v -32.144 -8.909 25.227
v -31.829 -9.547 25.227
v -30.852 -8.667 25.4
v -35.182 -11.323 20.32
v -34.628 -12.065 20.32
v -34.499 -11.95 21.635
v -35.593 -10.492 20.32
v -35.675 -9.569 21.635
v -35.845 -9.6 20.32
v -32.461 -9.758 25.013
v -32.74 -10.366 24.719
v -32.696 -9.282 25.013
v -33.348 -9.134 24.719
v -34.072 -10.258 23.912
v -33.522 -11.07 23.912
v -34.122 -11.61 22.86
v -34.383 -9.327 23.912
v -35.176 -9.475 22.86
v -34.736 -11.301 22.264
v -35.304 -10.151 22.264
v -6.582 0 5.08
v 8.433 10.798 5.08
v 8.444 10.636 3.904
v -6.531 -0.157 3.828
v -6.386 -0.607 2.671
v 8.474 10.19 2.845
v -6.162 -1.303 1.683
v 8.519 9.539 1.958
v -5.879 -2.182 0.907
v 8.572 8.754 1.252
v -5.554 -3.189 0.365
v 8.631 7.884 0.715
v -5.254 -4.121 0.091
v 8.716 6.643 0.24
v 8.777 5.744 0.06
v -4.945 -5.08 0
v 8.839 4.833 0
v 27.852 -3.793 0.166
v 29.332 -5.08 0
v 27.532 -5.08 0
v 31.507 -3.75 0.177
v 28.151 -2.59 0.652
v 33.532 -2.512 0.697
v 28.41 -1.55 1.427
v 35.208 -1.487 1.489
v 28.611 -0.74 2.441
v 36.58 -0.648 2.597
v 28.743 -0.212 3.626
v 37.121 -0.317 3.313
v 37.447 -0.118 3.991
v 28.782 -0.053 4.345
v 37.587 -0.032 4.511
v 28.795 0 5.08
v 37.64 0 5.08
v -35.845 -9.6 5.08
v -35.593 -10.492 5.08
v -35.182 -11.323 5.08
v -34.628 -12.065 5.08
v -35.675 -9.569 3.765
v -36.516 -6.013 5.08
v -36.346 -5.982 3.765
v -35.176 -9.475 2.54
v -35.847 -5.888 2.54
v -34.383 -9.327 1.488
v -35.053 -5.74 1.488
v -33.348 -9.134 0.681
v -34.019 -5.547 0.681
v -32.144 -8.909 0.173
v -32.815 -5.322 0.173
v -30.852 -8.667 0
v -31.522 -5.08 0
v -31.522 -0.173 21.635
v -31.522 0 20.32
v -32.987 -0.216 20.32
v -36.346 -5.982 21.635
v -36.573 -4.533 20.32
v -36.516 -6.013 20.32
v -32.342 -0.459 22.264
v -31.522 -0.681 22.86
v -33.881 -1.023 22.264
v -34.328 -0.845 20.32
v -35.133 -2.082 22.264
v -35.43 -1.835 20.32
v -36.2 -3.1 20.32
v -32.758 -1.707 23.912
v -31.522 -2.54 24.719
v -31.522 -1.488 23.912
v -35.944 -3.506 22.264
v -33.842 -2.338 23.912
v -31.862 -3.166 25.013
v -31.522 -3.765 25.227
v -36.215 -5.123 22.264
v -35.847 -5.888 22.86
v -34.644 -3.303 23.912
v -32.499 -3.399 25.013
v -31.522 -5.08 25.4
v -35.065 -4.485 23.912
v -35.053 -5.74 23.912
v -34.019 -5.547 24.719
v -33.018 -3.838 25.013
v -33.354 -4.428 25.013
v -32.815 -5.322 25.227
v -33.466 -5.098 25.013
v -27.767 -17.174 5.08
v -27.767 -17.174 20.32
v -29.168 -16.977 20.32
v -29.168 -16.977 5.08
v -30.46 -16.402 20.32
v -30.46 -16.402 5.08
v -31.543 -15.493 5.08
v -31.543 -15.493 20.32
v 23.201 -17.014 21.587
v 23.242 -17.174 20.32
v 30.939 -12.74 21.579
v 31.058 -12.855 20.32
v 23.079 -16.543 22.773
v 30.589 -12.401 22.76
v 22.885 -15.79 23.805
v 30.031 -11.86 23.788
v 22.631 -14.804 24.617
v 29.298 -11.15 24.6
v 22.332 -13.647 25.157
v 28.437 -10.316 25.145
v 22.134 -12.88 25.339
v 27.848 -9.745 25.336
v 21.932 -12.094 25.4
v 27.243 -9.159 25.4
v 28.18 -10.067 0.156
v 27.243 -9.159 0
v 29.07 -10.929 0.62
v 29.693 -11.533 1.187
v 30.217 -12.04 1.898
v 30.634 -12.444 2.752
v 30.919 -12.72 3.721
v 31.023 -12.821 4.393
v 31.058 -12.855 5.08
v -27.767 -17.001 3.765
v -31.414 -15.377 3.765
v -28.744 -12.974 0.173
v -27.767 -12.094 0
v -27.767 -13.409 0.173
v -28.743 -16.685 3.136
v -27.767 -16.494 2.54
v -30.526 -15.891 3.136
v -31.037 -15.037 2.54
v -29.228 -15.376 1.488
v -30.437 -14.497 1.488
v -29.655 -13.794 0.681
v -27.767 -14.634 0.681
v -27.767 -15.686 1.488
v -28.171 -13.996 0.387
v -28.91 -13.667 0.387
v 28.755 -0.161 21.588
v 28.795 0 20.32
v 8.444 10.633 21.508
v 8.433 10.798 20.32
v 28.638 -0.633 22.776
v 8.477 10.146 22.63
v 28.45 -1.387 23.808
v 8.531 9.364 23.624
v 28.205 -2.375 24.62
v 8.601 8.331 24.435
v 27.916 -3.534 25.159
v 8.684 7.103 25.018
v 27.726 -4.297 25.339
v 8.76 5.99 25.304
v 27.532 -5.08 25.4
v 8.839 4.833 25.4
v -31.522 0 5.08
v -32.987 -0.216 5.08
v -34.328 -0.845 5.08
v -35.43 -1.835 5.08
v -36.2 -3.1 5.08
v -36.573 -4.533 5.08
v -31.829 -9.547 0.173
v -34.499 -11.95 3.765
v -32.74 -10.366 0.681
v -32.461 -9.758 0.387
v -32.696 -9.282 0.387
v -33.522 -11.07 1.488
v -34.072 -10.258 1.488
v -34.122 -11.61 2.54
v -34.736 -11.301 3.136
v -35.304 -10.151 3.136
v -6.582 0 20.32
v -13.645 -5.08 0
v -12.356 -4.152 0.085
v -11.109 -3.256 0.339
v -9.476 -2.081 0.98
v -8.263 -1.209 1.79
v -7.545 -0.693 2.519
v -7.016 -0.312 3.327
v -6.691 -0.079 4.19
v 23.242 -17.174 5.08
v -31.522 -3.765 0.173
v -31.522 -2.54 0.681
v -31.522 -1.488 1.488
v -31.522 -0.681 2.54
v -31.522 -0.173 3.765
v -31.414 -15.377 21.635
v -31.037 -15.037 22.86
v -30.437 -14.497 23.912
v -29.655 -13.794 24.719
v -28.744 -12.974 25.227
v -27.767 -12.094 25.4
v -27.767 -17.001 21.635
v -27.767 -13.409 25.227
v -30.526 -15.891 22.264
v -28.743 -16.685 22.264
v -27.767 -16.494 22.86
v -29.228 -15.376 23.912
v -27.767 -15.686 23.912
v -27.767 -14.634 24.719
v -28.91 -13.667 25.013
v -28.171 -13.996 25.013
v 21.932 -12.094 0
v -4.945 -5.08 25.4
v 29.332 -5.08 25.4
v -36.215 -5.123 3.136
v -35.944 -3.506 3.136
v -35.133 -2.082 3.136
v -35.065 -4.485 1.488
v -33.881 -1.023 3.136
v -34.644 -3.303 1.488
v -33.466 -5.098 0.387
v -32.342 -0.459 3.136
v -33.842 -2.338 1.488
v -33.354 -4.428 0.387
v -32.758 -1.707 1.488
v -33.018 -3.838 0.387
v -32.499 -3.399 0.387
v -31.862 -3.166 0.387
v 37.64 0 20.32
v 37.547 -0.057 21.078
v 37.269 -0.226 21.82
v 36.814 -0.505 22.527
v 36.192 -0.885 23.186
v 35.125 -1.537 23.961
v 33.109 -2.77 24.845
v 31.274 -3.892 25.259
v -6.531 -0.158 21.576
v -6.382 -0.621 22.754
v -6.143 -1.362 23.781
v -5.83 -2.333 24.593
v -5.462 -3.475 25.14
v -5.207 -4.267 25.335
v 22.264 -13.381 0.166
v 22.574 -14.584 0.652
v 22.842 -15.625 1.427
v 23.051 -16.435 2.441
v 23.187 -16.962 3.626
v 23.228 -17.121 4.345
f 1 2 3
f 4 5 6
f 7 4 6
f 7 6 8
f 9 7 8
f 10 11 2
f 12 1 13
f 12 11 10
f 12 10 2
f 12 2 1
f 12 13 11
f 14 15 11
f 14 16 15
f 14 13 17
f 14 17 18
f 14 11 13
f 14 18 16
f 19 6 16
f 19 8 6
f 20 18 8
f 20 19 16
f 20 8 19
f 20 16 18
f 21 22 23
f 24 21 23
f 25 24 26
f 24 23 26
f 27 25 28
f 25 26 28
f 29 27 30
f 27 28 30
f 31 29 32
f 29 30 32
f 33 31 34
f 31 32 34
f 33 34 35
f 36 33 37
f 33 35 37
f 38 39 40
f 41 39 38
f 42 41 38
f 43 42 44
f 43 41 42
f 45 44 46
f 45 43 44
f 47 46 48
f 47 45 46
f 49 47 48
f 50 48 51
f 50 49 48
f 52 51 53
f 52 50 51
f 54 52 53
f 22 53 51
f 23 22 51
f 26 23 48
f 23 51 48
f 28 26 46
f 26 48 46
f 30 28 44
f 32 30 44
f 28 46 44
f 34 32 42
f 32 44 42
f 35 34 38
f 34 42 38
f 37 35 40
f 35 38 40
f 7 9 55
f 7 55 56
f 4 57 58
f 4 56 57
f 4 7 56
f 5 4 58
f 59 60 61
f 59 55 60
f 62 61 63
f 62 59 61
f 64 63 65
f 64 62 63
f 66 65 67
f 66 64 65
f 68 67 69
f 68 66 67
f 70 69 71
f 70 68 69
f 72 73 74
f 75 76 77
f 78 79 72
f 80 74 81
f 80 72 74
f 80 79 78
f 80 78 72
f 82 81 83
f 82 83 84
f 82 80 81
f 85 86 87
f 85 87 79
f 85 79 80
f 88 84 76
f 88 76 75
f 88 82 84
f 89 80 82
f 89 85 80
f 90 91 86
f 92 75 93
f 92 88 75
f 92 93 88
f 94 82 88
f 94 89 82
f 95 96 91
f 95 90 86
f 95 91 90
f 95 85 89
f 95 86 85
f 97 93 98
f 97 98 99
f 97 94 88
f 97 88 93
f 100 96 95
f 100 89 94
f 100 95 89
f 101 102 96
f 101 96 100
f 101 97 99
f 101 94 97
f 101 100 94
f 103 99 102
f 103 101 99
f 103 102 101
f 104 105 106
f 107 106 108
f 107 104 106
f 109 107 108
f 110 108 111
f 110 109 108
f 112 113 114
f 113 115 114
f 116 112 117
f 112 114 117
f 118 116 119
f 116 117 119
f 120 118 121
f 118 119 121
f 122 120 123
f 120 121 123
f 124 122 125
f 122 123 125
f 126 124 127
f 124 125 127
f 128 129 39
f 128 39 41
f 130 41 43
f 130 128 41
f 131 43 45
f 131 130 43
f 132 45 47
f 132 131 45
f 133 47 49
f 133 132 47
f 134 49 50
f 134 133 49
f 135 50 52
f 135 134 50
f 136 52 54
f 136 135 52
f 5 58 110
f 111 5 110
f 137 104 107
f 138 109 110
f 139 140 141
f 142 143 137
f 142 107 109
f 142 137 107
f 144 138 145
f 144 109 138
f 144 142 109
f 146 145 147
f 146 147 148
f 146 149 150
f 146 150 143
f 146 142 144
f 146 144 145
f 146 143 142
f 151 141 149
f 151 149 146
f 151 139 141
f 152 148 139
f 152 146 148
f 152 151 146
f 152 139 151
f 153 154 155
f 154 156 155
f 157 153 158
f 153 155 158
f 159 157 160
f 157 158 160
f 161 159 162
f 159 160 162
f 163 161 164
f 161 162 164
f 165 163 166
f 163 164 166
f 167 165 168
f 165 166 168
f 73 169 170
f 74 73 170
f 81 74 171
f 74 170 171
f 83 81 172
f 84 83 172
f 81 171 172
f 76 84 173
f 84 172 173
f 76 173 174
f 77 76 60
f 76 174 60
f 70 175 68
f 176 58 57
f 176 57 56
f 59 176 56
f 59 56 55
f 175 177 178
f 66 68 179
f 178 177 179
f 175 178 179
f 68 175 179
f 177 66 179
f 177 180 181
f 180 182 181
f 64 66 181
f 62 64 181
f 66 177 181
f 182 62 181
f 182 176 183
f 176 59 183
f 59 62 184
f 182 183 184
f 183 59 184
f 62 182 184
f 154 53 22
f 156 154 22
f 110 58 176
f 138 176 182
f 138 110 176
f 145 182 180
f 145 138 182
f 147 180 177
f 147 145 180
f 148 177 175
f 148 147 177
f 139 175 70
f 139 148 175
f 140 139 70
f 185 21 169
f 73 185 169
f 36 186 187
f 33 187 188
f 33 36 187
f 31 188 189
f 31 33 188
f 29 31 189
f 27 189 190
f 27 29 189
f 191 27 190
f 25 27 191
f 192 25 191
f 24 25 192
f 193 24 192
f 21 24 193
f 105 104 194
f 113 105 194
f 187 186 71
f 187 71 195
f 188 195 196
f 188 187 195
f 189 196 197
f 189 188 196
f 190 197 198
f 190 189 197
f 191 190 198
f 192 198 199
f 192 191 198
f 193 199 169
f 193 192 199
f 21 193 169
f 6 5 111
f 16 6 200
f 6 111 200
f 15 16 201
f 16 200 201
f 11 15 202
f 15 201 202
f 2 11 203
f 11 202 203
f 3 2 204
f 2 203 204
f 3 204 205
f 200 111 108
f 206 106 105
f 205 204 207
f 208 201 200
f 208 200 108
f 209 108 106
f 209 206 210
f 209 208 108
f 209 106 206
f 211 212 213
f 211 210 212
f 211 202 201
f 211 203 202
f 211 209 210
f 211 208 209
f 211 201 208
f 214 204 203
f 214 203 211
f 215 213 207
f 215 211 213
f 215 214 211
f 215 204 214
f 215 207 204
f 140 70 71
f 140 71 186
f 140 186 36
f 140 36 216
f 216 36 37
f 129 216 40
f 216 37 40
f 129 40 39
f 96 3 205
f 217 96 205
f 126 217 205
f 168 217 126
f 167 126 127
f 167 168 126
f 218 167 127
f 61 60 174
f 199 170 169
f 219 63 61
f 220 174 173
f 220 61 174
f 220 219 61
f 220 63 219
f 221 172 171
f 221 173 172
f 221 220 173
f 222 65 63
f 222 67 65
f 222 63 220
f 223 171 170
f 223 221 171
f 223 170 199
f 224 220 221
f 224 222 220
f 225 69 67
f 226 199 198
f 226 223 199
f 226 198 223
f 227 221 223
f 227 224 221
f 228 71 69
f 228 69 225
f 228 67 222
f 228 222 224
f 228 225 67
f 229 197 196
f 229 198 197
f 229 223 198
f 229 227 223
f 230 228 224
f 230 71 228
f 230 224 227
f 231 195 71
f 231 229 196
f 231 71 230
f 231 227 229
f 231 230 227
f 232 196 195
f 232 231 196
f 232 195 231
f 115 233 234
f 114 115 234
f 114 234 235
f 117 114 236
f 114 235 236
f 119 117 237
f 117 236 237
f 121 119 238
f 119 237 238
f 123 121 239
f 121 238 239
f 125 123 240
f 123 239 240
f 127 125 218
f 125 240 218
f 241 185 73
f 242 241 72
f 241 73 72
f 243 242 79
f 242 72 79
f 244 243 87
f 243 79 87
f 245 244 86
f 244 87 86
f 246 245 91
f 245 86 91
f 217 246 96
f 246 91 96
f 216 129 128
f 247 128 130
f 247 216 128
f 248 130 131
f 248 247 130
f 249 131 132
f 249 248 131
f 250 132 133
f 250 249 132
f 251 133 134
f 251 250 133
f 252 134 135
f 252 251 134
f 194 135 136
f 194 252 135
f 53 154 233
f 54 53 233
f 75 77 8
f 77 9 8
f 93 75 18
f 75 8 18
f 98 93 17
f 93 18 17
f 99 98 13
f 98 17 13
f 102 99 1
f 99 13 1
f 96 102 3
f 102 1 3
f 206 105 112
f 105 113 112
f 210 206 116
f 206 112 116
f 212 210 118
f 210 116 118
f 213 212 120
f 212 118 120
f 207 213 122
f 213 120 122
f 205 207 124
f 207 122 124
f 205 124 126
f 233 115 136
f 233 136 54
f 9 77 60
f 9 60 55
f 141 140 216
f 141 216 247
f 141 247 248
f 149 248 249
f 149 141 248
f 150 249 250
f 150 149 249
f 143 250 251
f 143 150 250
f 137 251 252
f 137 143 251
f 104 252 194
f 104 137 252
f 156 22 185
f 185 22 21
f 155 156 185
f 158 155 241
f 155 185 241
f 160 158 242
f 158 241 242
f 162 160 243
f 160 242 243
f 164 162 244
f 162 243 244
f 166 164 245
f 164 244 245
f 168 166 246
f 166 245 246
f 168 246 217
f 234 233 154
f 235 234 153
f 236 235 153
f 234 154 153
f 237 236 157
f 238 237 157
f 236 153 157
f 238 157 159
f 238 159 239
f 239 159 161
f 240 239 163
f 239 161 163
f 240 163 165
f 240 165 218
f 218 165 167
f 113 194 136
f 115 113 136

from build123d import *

# Parameters (mm, degrees)
F2_DEPTH     = 25.4
F3_R         = 5.08
F4_T1_DEPTH  = 63.7089962256
F4_T3_DEPTH  = 34.3299805756
F4_T5_DEPTH  = 39.8420593032
F4_T7_DEPTH  = 15.24
F4_T12_DEPTH = 5.08
F4_T18_DEPTH = 5.08
F4_T24_DEPTH = 5.08
F4_T30_DEPTH = 5.08
F4_T36_DEPTH = 37.6403571065
F4_T41_DEPTH = 43.8944483223
F4_T46_DEPTH = 48.4484626095
F4_T51_DEPTH = 34.2442917913
F4_T57_DEPTH = 43.8944483223
F4_T61_DEPTH = 37.6403571065
F4_T68_DEPTH = 48.4484626095
F4_T72_DEPTH = 34.2442917913


# Not quite as in the source:
# - a fillet or chamfer that OpenCascade refuses, or shapes differently, is made with other operations: its cross-section is extruded or revolved along the edge and cut away or added


with BuildPart() as f2:
    # F1 (on face) → F2 (new body)
    with BuildSketch(Plane.XY):
        Polygon((8.4329312667, 10.7982652262), (-6.5817977302, 0), (-37.6396663487, 0), (-35.5828553438, -11.0039459541), (-30.0294607878, -17.1743836254), (23.241976276, -17.1743836254), (31.0578662902, -12.8550762311), (37.6396663487, 0), (28.7953745574, 0), align=None)
    extrude(amount=F2_DEPTH)

    # F3
    f3_edges = [f2.edges().sort_by_distance(p)[0] for p in [
        (-22.110732, 0, 25.4),
        (18.614153, 5.399133, 25.4),
        (33.21752, 0, 25.4),
        (34.348766, -6.427538, 25.4),
        (27.149921, -15.01473, 25.4),
        (-3.393742, -17.174384, 25.4),
        (-32.806158, -14.089165, 25.4),
        (-36.611261, -5.501973, 25.4),
        (-32.806158, -14.089165, 0),
        (-36.611261, -5.501973, 0),
        (-35.582855, -11.003946, 12.7),
        (0.925567, 5.399133, 25.4),
    ]]
    fillet(f3_edges, radius=F3_R)

    # F4: fillet of radius 5.08 on 11 edges, made by hand

    # F4_s2 → F4_t1 (cut)
    with BuildSketch(Plane.YZ.offset(-27.7670199495)):
        with BuildLine():
            ThreePointArc((-12.0943836254, 0), (-15.6864860738, 1.4878975516), (-17.1743836254, 5.08))
            Line((-17.1743836254, 5.08), (-17.1743836254, 0))
            Line((-17.1743836254, 0), (-12.0943836254, 0))
        make_face()
    extrude(amount=F4_T1_DEPTH, mode=Mode.SUBTRACT)

    # F4_s4 → F4_t3 (cut)
    with BuildSketch(Plane(origin=(-0.5817443509, -0.3214902809, 0), x_dir=(0, 0, 1), z_dir=(0.8752415471, 0.4836860907, 0))):
        with BuildLine():
            ThreePointArc((0, 21.1935547384), (1.4878975516, 24.7856571868), (5.08, 26.2735547384))
            Line((5.08, 26.2735547384), (0, 26.2735547384))
            Line((0, 26.2735547384), (0, 21.1935547384))
        make_face()
    extrude(amount=F4_T3_DEPTH, mode=Mode.SUBTRACT)

    # F4_s6 → F4_t5 (cut)
    with BuildSketch(Plane(origin=(-4.5520149502, -8.8906528107, 0), x_dir=(0, 0, 1), z_dir=(0.4557383348, 0.8901137962, 0))):
        with BuildLine():
            ThreePointArc((0, 28.4235863007), (1.4878975516, 32.0156887492), (5.08, 33.5035863007))
            Line((5.08, 33.5035863007), (0, 33.5035863007))
            Line((0, 33.5035863007), (0, 28.4235863007))
        make_face()
    extrude(amount=F4_T5_DEPTH, mode=Mode.SUBTRACT)

    # F4_s8 → F4_t7 (cut)
    with BuildSketch(Plane.XY.offset(5.08)):
        with BuildLine():
            ThreePointArc((-31.5221548367, 0), (-35.430345336, -1.8346268287), (-36.5156731811, -6.0133673145))
            Line((-36.5156731811, -6.0133673145), (-37.6396663487, 0))
            Line((-37.6396663487, 0), (-31.5221548367, 0))
        make_face()
        with BuildLine():
            ThreePointArc((-27.7670199495, -17.1743836254), (-29.8337598255, -16.7349640077), (-31.5429540141, -15.4927246824))
            Line((-31.5429540141, -15.4927246824), (-30.0294607878, -17.1743836254))
            Line((-30.0294607878, -17.1743836254), (-27.7670199495, -17.1743836254))
        make_face()
    extrude(amount=F4_T7_DEPTH, mode=Mode.SUBTRACT)


with BuildPart() as f4_tool10:
    # F4_s11 → F4_t12 (new body)
    with BuildSketch(Plane.XY.offset(20.32)):
        Polygon((-27.7670199495, -12.0943836254), (-27.7670199495, -17.1743836254), (-30.0294607878, -17.1743836254), (-31.5429540141, -15.4927246824), align=None)
    extrude(amount=F4_T12_DEPTH)

    # F4_s13 → F4_t14 (revolve, cut)
    with BuildSketch(Plane(origin=(-27.7670199495, -12.0943836254, 20.32), x_dir=(0.4068385583, 0.9135000753, 0), z_dir=(0.9135000753, -0.4068385583, 0))):
        with BuildLine():
            ThreePointArc((0, -5.08), (5.08, 0), (0, 5.08))
            Line((0, 5.08), (0, -5.08))
        make_face()
    revolve(axis=Axis((-27.7670199495, -12.0943836254, 20.32), (0, 0, 1)), mode=Mode.SUBTRACT)


with BuildPart() as f2_1:
    add(f2.part)

    # F4_t9: cut F4_tool10
    add(f4_tool10.part, mode=Mode.SUBTRACT)


with BuildPart() as f4_tool16:
    # F4_s17 → F4_t18 (new body)
    with BuildSketch(Plane.XY.offset(20.32)):
        Polygon((-31.5221548367, -5.08), (-31.5221548367, 0), (-37.6396663487, 0), (-36.5156731811, -6.0133673145), align=None)
    extrude(amount=F4_T18_DEPTH)

    # F4_s19 → F4_t20 (revolve, cut)
    with BuildSketch(Plane(origin=(-31.5221548367, -5.08, 20.32), x_dir=(0.7693288384, -0.6388529865, 0), z_dir=(-0.6388529865, -0.7693288384, 0))):
        with BuildLine():
            ThreePointArc((0, -5.08), (5.08, 0), (0, 5.08))
            Line((0, 5.08), (0, -5.08))
        make_face()
    revolve(axis=Axis((-31.5221548367, -5.08, 20.32), (0, 0, 1)), mode=Mode.SUBTRACT)


with BuildPart() as f2_2:
    add(f2_1.part)

    # F4_t15: cut F4_tool16
    add(f4_tool16.part, mode=Mode.SUBTRACT)


with BuildPart() as f4_tool22:
    # F4_s23 → F4_t24 (new body)
    with BuildSketch(Plane.XY.offset(5.08)):
        Polygon((-27.7670199495, -12.0943836254), (-27.7670199495, -17.1743836254), (-30.0294607878, -17.1743836254), (-31.5429540141, -15.4927246824), align=None)
    extrude(amount=-F4_T24_DEPTH)

    # F4_s25 → F4_t26 (revolve, cut)
    with BuildSketch(Plane(origin=(-27.7670199495, -12.0943836254, 5.08), x_dir=(0.4068385583, 0.9135000753, 0), z_dir=(-0.9135000753, 0.4068385583, 0))):
        with BuildLine():
            ThreePointArc((0, -5.08), (5.08, 0), (0, 5.08))
            Line((0, 5.08), (0, -5.08))
        make_face()
    revolve(axis=Axis((-27.7670199495, -12.0943836254, 5.08), (0, 0, -1)), mode=Mode.SUBTRACT)


with BuildPart() as f2_3:
    add(f2_2.part)

    # F4_t21: cut F4_tool22
    add(f4_tool22.part, mode=Mode.SUBTRACT)


with BuildPart() as f4_tool28:
    # F4_s29 → F4_t30 (new body)
    with BuildSketch(Plane.XY.offset(5.08)):
        Polygon((-31.5221548367, -5.08), (-31.5221548367, 0), (-37.6396663487, 0), (-36.5156731811, -6.0133673145), align=None)
    extrude(amount=-F4_T30_DEPTH)

    # F4_s31 → F4_t32 (revolve, cut)
    with BuildSketch(Plane(origin=(-31.5221548367, -5.08, 5.08), x_dir=(0.7693288384, -0.6388529865, 0), z_dir=(0.6388529865, 0.7693288384, 0))):
        with BuildLine():
            ThreePointArc((0, -5.08), (5.08, 0), (0, 5.08))
            Line((0, 5.08), (0, -5.08))
        make_face()
    revolve(axis=Axis((-31.5221548367, -5.08, 5.08), (0, 0, -1)), mode=Mode.SUBTRACT)


with BuildPart() as f2_4:
    add(f2_3.part)

    # F4_t27: cut F4_tool28
    add(f4_tool28.part, mode=Mode.SUBTRACT)


with BuildPart() as f4_tool34:
    # F4_s35 → F4_t36 (new body)
    with BuildSketch(Plane.YZ.offset(6.1182022698)):
        with BuildLine():
            ThreePointArc((-5.08, 0), (-1.4878975516, 1.4878975516), (0, 5.08))
            Line((0, 5.08), (0, 0))
            Line((0, 0), (-5.08, 0))
        make_face()
    extrude(amount=-F4_T36_DEPTH)

    split(bisect_by=Plane(origin=(-2.2437256361, 3.119846722, 0), x_dir=(0, 0, 1), z_dir=(-0.5838652247, 0.8118506016, 0)), keep=Keep.TOP)


with BuildPart() as f2_5:
    add(f2_4.part)

    # F4_t33: cut F4_tool34
    add(f4_tool34.part, mode=Mode.SUBTRACT)


with BuildPart() as f4_tool39:
    # F4_s40 → F4_t41 (new body)
    with BuildSketch(Plane(origin=(20.9871595433, 15.0935068584, 0), x_dir=(0, 0, 1), z_dir=(-0.8118506016, -0.5838652247, 0))):
        with BuildLine():
            ThreePointArc((5.08, 3.8428828109), (1.4878975516, 2.3549852594), (0, -1.2371171891))
            Line((0, -1.2371171891), (0, 3.8428828109))
            Line((0, 3.8428828109), (5.08, 3.8428828109))
        make_face()
    extrude(amount=F4_T41_DEPTH)

    split(bisect_by=Plane.XZ, keep=Keep.BOTTOM)


with BuildPart() as f2_6:
    add(f2_5.part)

    # F4_t38: cut F4_tool39
    add(f4_tool39.part, mode=Mode.SUBTRACT)


with BuildPart() as f4_tool44:
    # F4_s45 → F4_t46 (new body)
    with BuildSketch(Plane(origin=(33.6949109219, -17.8685131108, 0), x_dir=(0, 0, 1), z_dir=(-0.8834621049, 0.4685026246, 0))):
        with BuildLine():
            ThreePointArc((5.08, 13.4907085573), (1.4878975516, 12.0028110057), (0, 8.4107085573))
            Line((0, 8.4107085573), (0, 13.4907085573))
            Line((0, 13.4907085573), (5.08, 13.4907085573))
        make_face()
    extrude(amount=F4_T46_DEPTH)

    split(bisect_by=Plane.XZ, keep=Keep.BOTTOM)


with BuildPart() as f2_7:
    add(f2_6.part)

    # F4_t43: cut F4_tool44
    add(f4_tool44.part, mode=Mode.SUBTRACT)


with BuildPart() as f4_tool49:
    # F4_s50 → F4_t51 (new body)
    with BuildSketch(Plane.YZ.offset(50.3396663487)):
        with BuildLine():
            ThreePointArc((-5.08, 0), (-1.4878975516, 1.4878975516), (0, 5.08))
            Line((0, 5.08), (0, 0))
            Line((0, 0), (-5.08, 0))
        make_face()
    extrude(amount=-F4_T51_DEPTH)

    split(bisect_by=Plane(origin=(6.3204323672, 11.918529778, 0), x_dir=(0, 0, 1), z_dir=(0.4685026246, 0.8834621049, 0)), keep=Keep.TOP)


with BuildPart() as f2_8:
    add(f2_7.part)

    # F4_t48: cut F4_tool49
    add(f4_tool49.part, mode=Mode.SUBTRACT)


with BuildPart() as f4_tool55:
    # F4_s56 → F4_t57 (new body)
    with BuildSketch(Plane(origin=(20.9871595433, 15.0935068584, 0), x_dir=(0, 0, 1), z_dir=(-0.8118506016, -0.5838652247, 0))):
        with BuildLine():
            ThreePointArc((5.08, 3.8428828109), (1.4878975516, 2.3549852594), (0, -1.2371171891))
            Line((0, -1.2371171891), (0, 3.8428828109))
            Line((0, 3.8428828109), (5.08, 3.8428828109))
        make_face()
    extrude(amount=F4_T57_DEPTH)

    split(bisect_by=Plane.XZ, keep=Keep.TOP)


with BuildPart() as f4_tool59:
    # F4_s60 → F4_t61 (new body)
    with BuildSketch(Plane.YZ.offset(6.1182022698)):
        with BuildLine():
            ThreePointArc((-5.08, 0), (-1.4878975516, 1.4878975516), (0, 5.08))
            Line((0, 5.08), (0, 0))
            Line((0, 0), (-5.08, 0))
        make_face()
    extrude(amount=-F4_T61_DEPTH)

    split(bisect_by=Plane(origin=(-2.2437256361, 3.119846722, 0), x_dir=(0, 0, 1), z_dir=(0.5838652247, -0.8118506016, 0)), keep=Keep.TOP)


with BuildPart() as f4_tool55_1:
    add(f4_tool55.part)

    # F4_t63: intersect F4_tool59
    add(f4_tool59.part, mode=Mode.INTERSECT)


with BuildPart() as f2_9:
    add(f2_8.part)

    # F4_t53: cut F4_tool55
    add(f4_tool55_1.part, mode=Mode.SUBTRACT)


with BuildPart() as f4_tool66:
    # F4_s67 → F4_t68 (new body)
    with BuildSketch(Plane(origin=(33.6949109219, -17.8685131108, 0), x_dir=(0, 0, 1), z_dir=(-0.8834621049, 0.4685026246, 0))):
        with BuildLine():
            ThreePointArc((5.08, 13.4907085573), (1.4878975516, 12.0028110057), (0, 8.4107085573))
            Line((0, 8.4107085573), (0, 13.4907085573))
            Line((0, 13.4907085573), (5.08, 13.4907085573))
        make_face()
    extrude(amount=F4_T68_DEPTH)

    split(bisect_by=Plane.XZ, keep=Keep.TOP)


with BuildPart() as f4_tool70:
    # F4_s71 → F4_t72 (new body)
    with BuildSketch(Plane.YZ.offset(50.3396663487)):
        with BuildLine():
            ThreePointArc((-5.08, 0), (-1.4878975516, 1.4878975516), (0, 5.08))
            Line((0, 5.08), (0, 0))
            Line((0, 0), (-5.08, 0))
        make_face()
    extrude(amount=-F4_T72_DEPTH)

    split(bisect_by=Plane(origin=(6.3204323672, 11.918529778, 0), x_dir=(0, 0, 1), z_dir=(-0.4685026246, -0.8834621049, 0)), keep=Keep.TOP)


with BuildPart() as f4_tool66_1:
    add(f4_tool66.part)

    # F4_t74: intersect F4_tool70
    add(f4_tool70.part, mode=Mode.INTERSECT)


with BuildPart() as f2_10:
    add(f2_9.part)

    # F4_t64: cut F4_tool66
    add(f4_tool66_1.part, mode=Mode.SUBTRACT)


solid = f2_10.part
